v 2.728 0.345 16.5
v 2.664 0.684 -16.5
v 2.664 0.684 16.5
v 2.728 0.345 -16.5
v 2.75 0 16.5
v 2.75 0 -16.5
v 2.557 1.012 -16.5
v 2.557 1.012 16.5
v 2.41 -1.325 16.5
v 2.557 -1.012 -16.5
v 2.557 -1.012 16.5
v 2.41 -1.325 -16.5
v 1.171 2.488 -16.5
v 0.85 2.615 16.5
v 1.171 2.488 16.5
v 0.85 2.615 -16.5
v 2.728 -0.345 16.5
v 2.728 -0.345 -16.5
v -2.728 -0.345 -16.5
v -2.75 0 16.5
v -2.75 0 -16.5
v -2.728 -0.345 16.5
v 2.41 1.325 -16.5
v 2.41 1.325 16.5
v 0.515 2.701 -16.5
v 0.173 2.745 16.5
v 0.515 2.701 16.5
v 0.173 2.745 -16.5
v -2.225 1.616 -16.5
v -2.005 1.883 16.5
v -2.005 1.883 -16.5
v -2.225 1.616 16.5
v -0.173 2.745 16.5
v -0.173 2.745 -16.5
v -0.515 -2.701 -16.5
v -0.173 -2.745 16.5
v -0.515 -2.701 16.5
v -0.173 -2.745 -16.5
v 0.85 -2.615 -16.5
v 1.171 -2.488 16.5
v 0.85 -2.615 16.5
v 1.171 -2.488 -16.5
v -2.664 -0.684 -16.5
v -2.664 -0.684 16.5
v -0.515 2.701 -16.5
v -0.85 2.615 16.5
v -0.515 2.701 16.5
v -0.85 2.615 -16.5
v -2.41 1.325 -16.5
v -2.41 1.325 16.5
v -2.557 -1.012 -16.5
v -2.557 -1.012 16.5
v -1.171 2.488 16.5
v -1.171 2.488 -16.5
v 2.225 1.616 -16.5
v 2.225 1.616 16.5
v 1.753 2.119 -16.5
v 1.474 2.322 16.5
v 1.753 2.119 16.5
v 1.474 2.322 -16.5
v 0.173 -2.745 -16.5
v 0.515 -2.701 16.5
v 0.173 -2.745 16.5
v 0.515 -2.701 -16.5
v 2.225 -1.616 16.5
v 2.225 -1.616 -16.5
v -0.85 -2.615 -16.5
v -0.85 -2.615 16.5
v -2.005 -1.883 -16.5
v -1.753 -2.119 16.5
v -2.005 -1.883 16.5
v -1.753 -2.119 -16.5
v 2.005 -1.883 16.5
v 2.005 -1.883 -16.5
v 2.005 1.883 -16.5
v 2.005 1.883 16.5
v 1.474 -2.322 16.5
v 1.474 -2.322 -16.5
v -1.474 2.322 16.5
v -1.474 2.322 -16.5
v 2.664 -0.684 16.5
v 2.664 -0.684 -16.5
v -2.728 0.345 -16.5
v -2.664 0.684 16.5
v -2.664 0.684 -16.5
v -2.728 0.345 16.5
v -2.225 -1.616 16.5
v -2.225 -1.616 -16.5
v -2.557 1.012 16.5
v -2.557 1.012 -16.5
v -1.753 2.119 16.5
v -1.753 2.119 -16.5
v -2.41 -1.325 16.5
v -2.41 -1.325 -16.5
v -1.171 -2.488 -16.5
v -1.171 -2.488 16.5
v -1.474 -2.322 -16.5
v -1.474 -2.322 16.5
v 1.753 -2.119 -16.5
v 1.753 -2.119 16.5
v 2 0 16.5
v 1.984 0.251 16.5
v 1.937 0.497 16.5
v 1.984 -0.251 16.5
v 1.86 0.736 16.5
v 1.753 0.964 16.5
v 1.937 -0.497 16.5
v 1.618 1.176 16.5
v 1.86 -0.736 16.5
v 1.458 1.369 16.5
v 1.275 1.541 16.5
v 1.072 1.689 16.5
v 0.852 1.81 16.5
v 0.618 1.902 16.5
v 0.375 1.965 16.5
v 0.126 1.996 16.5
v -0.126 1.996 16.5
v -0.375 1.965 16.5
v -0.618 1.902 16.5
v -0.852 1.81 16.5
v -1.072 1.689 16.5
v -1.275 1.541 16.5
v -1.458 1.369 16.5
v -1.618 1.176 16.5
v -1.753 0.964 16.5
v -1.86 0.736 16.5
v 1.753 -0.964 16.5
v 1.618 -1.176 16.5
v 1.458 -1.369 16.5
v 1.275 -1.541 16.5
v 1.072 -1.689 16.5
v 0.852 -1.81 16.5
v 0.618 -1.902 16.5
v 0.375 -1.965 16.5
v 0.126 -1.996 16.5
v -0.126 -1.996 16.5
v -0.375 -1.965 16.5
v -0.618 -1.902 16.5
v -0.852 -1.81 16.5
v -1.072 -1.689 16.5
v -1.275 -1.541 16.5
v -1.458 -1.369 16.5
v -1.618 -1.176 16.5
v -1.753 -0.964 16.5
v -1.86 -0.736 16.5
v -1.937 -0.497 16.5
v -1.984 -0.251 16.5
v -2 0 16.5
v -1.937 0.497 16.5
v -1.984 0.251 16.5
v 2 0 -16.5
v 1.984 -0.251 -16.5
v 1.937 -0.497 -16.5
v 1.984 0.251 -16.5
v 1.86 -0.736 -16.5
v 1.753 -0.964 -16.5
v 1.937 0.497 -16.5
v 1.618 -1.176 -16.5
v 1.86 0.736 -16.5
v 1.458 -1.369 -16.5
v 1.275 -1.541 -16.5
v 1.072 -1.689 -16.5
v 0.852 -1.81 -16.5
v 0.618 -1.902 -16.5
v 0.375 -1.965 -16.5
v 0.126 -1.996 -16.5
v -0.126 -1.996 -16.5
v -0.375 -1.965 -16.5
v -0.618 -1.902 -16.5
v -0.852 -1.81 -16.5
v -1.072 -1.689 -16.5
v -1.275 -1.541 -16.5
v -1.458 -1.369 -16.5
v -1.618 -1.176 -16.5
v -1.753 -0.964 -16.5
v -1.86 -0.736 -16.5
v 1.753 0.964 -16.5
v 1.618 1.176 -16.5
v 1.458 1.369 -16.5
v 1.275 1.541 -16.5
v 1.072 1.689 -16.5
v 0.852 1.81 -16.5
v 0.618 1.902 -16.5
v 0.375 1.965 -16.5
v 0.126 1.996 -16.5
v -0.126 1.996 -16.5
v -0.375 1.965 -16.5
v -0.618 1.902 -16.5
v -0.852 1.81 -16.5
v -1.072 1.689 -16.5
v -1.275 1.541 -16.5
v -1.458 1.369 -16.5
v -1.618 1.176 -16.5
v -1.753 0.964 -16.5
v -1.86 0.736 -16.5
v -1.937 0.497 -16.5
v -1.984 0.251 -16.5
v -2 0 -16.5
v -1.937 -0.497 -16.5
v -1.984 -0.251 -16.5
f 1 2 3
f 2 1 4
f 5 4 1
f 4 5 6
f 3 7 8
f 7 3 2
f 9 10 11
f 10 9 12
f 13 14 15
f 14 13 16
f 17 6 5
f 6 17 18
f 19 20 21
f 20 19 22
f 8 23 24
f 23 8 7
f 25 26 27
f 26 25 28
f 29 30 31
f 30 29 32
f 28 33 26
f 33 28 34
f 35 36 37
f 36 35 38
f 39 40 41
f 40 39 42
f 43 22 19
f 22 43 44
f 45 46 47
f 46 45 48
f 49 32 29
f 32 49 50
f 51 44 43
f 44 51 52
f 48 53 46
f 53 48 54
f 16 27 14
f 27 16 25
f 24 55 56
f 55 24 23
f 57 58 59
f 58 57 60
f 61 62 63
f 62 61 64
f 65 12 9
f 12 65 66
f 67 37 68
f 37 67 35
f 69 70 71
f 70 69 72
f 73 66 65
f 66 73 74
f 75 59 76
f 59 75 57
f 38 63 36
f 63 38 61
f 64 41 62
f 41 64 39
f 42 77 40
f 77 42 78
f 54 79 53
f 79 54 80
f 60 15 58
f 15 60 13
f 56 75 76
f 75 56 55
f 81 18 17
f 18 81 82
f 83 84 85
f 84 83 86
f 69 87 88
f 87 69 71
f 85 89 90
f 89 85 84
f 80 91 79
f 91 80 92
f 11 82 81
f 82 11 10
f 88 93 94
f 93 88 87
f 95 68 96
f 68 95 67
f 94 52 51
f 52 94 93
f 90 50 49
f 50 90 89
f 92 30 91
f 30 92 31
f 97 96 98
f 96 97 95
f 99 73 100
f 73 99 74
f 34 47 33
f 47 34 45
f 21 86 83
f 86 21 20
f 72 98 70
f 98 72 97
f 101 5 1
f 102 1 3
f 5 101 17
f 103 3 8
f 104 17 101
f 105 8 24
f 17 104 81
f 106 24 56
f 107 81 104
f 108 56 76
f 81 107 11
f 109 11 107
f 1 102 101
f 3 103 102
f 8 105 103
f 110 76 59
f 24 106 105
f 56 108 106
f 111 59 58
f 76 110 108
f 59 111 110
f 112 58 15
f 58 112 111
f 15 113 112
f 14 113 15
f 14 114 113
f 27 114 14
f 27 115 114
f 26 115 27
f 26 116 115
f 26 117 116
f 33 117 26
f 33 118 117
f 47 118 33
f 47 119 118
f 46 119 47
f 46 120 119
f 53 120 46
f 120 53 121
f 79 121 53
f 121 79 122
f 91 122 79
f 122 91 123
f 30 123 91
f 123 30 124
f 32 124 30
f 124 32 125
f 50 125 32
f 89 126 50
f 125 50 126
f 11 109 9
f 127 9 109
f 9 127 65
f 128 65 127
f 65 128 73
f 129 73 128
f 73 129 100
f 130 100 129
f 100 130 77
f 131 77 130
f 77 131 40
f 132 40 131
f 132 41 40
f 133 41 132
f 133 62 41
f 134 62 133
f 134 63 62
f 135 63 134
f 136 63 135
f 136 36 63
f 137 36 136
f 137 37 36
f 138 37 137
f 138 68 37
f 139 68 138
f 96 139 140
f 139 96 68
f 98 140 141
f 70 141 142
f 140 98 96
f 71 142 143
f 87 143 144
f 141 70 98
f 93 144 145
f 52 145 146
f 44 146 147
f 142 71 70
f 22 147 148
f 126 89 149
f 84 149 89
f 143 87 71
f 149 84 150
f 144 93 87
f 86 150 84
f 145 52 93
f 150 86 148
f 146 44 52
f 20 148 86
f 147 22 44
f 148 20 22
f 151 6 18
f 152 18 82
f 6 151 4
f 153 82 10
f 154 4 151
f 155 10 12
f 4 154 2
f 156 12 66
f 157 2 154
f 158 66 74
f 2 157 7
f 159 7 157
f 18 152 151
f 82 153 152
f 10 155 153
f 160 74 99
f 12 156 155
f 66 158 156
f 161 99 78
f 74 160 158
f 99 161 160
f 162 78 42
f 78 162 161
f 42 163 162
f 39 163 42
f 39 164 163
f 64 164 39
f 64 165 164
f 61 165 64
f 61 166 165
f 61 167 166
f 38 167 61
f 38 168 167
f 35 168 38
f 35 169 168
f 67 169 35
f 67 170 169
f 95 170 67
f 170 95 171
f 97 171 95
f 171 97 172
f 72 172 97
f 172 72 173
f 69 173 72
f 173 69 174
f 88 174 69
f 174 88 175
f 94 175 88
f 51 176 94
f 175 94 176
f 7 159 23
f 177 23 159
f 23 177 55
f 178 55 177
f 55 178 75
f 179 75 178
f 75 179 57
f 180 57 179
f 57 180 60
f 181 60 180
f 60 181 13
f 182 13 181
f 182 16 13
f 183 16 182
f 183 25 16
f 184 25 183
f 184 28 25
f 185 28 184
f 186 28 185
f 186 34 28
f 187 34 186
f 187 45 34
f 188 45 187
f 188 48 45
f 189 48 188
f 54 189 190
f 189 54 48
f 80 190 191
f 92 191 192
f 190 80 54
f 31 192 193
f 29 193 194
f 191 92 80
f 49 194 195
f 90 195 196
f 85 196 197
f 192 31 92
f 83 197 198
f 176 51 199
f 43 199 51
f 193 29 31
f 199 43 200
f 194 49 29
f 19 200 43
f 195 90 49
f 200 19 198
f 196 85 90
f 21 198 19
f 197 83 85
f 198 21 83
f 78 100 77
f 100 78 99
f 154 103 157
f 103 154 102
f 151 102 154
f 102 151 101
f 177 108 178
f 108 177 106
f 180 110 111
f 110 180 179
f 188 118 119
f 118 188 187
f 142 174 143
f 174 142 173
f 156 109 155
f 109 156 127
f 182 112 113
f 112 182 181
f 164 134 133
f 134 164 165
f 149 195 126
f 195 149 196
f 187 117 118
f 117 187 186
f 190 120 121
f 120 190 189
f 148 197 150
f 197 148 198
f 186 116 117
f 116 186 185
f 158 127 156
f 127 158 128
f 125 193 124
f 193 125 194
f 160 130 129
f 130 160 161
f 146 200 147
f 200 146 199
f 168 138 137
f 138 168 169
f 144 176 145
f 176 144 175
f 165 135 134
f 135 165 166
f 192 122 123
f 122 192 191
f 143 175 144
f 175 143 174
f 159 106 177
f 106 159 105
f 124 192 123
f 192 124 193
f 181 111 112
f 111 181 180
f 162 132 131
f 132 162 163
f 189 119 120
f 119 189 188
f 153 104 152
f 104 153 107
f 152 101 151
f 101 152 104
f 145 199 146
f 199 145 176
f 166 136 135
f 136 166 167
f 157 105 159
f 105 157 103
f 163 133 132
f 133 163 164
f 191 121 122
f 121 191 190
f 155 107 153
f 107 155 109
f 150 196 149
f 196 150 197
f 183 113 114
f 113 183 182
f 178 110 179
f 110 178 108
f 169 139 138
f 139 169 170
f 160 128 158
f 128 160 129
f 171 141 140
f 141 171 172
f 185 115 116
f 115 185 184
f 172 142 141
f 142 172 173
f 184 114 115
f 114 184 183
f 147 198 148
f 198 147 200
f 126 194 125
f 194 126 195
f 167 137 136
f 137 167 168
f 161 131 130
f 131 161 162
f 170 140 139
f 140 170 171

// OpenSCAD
$fn = 50;


difference() {
	union() {
		translate(v = [0, 0, -16.5000000000]) {
			cylinder(h = 33, r = 2.7500000000);
		}
	}
	union() {
		translate(v = [0, 0, -100.0000000000]) {
			cylinder(h = 200, r = 2.0000000000);
		}
	}
}
